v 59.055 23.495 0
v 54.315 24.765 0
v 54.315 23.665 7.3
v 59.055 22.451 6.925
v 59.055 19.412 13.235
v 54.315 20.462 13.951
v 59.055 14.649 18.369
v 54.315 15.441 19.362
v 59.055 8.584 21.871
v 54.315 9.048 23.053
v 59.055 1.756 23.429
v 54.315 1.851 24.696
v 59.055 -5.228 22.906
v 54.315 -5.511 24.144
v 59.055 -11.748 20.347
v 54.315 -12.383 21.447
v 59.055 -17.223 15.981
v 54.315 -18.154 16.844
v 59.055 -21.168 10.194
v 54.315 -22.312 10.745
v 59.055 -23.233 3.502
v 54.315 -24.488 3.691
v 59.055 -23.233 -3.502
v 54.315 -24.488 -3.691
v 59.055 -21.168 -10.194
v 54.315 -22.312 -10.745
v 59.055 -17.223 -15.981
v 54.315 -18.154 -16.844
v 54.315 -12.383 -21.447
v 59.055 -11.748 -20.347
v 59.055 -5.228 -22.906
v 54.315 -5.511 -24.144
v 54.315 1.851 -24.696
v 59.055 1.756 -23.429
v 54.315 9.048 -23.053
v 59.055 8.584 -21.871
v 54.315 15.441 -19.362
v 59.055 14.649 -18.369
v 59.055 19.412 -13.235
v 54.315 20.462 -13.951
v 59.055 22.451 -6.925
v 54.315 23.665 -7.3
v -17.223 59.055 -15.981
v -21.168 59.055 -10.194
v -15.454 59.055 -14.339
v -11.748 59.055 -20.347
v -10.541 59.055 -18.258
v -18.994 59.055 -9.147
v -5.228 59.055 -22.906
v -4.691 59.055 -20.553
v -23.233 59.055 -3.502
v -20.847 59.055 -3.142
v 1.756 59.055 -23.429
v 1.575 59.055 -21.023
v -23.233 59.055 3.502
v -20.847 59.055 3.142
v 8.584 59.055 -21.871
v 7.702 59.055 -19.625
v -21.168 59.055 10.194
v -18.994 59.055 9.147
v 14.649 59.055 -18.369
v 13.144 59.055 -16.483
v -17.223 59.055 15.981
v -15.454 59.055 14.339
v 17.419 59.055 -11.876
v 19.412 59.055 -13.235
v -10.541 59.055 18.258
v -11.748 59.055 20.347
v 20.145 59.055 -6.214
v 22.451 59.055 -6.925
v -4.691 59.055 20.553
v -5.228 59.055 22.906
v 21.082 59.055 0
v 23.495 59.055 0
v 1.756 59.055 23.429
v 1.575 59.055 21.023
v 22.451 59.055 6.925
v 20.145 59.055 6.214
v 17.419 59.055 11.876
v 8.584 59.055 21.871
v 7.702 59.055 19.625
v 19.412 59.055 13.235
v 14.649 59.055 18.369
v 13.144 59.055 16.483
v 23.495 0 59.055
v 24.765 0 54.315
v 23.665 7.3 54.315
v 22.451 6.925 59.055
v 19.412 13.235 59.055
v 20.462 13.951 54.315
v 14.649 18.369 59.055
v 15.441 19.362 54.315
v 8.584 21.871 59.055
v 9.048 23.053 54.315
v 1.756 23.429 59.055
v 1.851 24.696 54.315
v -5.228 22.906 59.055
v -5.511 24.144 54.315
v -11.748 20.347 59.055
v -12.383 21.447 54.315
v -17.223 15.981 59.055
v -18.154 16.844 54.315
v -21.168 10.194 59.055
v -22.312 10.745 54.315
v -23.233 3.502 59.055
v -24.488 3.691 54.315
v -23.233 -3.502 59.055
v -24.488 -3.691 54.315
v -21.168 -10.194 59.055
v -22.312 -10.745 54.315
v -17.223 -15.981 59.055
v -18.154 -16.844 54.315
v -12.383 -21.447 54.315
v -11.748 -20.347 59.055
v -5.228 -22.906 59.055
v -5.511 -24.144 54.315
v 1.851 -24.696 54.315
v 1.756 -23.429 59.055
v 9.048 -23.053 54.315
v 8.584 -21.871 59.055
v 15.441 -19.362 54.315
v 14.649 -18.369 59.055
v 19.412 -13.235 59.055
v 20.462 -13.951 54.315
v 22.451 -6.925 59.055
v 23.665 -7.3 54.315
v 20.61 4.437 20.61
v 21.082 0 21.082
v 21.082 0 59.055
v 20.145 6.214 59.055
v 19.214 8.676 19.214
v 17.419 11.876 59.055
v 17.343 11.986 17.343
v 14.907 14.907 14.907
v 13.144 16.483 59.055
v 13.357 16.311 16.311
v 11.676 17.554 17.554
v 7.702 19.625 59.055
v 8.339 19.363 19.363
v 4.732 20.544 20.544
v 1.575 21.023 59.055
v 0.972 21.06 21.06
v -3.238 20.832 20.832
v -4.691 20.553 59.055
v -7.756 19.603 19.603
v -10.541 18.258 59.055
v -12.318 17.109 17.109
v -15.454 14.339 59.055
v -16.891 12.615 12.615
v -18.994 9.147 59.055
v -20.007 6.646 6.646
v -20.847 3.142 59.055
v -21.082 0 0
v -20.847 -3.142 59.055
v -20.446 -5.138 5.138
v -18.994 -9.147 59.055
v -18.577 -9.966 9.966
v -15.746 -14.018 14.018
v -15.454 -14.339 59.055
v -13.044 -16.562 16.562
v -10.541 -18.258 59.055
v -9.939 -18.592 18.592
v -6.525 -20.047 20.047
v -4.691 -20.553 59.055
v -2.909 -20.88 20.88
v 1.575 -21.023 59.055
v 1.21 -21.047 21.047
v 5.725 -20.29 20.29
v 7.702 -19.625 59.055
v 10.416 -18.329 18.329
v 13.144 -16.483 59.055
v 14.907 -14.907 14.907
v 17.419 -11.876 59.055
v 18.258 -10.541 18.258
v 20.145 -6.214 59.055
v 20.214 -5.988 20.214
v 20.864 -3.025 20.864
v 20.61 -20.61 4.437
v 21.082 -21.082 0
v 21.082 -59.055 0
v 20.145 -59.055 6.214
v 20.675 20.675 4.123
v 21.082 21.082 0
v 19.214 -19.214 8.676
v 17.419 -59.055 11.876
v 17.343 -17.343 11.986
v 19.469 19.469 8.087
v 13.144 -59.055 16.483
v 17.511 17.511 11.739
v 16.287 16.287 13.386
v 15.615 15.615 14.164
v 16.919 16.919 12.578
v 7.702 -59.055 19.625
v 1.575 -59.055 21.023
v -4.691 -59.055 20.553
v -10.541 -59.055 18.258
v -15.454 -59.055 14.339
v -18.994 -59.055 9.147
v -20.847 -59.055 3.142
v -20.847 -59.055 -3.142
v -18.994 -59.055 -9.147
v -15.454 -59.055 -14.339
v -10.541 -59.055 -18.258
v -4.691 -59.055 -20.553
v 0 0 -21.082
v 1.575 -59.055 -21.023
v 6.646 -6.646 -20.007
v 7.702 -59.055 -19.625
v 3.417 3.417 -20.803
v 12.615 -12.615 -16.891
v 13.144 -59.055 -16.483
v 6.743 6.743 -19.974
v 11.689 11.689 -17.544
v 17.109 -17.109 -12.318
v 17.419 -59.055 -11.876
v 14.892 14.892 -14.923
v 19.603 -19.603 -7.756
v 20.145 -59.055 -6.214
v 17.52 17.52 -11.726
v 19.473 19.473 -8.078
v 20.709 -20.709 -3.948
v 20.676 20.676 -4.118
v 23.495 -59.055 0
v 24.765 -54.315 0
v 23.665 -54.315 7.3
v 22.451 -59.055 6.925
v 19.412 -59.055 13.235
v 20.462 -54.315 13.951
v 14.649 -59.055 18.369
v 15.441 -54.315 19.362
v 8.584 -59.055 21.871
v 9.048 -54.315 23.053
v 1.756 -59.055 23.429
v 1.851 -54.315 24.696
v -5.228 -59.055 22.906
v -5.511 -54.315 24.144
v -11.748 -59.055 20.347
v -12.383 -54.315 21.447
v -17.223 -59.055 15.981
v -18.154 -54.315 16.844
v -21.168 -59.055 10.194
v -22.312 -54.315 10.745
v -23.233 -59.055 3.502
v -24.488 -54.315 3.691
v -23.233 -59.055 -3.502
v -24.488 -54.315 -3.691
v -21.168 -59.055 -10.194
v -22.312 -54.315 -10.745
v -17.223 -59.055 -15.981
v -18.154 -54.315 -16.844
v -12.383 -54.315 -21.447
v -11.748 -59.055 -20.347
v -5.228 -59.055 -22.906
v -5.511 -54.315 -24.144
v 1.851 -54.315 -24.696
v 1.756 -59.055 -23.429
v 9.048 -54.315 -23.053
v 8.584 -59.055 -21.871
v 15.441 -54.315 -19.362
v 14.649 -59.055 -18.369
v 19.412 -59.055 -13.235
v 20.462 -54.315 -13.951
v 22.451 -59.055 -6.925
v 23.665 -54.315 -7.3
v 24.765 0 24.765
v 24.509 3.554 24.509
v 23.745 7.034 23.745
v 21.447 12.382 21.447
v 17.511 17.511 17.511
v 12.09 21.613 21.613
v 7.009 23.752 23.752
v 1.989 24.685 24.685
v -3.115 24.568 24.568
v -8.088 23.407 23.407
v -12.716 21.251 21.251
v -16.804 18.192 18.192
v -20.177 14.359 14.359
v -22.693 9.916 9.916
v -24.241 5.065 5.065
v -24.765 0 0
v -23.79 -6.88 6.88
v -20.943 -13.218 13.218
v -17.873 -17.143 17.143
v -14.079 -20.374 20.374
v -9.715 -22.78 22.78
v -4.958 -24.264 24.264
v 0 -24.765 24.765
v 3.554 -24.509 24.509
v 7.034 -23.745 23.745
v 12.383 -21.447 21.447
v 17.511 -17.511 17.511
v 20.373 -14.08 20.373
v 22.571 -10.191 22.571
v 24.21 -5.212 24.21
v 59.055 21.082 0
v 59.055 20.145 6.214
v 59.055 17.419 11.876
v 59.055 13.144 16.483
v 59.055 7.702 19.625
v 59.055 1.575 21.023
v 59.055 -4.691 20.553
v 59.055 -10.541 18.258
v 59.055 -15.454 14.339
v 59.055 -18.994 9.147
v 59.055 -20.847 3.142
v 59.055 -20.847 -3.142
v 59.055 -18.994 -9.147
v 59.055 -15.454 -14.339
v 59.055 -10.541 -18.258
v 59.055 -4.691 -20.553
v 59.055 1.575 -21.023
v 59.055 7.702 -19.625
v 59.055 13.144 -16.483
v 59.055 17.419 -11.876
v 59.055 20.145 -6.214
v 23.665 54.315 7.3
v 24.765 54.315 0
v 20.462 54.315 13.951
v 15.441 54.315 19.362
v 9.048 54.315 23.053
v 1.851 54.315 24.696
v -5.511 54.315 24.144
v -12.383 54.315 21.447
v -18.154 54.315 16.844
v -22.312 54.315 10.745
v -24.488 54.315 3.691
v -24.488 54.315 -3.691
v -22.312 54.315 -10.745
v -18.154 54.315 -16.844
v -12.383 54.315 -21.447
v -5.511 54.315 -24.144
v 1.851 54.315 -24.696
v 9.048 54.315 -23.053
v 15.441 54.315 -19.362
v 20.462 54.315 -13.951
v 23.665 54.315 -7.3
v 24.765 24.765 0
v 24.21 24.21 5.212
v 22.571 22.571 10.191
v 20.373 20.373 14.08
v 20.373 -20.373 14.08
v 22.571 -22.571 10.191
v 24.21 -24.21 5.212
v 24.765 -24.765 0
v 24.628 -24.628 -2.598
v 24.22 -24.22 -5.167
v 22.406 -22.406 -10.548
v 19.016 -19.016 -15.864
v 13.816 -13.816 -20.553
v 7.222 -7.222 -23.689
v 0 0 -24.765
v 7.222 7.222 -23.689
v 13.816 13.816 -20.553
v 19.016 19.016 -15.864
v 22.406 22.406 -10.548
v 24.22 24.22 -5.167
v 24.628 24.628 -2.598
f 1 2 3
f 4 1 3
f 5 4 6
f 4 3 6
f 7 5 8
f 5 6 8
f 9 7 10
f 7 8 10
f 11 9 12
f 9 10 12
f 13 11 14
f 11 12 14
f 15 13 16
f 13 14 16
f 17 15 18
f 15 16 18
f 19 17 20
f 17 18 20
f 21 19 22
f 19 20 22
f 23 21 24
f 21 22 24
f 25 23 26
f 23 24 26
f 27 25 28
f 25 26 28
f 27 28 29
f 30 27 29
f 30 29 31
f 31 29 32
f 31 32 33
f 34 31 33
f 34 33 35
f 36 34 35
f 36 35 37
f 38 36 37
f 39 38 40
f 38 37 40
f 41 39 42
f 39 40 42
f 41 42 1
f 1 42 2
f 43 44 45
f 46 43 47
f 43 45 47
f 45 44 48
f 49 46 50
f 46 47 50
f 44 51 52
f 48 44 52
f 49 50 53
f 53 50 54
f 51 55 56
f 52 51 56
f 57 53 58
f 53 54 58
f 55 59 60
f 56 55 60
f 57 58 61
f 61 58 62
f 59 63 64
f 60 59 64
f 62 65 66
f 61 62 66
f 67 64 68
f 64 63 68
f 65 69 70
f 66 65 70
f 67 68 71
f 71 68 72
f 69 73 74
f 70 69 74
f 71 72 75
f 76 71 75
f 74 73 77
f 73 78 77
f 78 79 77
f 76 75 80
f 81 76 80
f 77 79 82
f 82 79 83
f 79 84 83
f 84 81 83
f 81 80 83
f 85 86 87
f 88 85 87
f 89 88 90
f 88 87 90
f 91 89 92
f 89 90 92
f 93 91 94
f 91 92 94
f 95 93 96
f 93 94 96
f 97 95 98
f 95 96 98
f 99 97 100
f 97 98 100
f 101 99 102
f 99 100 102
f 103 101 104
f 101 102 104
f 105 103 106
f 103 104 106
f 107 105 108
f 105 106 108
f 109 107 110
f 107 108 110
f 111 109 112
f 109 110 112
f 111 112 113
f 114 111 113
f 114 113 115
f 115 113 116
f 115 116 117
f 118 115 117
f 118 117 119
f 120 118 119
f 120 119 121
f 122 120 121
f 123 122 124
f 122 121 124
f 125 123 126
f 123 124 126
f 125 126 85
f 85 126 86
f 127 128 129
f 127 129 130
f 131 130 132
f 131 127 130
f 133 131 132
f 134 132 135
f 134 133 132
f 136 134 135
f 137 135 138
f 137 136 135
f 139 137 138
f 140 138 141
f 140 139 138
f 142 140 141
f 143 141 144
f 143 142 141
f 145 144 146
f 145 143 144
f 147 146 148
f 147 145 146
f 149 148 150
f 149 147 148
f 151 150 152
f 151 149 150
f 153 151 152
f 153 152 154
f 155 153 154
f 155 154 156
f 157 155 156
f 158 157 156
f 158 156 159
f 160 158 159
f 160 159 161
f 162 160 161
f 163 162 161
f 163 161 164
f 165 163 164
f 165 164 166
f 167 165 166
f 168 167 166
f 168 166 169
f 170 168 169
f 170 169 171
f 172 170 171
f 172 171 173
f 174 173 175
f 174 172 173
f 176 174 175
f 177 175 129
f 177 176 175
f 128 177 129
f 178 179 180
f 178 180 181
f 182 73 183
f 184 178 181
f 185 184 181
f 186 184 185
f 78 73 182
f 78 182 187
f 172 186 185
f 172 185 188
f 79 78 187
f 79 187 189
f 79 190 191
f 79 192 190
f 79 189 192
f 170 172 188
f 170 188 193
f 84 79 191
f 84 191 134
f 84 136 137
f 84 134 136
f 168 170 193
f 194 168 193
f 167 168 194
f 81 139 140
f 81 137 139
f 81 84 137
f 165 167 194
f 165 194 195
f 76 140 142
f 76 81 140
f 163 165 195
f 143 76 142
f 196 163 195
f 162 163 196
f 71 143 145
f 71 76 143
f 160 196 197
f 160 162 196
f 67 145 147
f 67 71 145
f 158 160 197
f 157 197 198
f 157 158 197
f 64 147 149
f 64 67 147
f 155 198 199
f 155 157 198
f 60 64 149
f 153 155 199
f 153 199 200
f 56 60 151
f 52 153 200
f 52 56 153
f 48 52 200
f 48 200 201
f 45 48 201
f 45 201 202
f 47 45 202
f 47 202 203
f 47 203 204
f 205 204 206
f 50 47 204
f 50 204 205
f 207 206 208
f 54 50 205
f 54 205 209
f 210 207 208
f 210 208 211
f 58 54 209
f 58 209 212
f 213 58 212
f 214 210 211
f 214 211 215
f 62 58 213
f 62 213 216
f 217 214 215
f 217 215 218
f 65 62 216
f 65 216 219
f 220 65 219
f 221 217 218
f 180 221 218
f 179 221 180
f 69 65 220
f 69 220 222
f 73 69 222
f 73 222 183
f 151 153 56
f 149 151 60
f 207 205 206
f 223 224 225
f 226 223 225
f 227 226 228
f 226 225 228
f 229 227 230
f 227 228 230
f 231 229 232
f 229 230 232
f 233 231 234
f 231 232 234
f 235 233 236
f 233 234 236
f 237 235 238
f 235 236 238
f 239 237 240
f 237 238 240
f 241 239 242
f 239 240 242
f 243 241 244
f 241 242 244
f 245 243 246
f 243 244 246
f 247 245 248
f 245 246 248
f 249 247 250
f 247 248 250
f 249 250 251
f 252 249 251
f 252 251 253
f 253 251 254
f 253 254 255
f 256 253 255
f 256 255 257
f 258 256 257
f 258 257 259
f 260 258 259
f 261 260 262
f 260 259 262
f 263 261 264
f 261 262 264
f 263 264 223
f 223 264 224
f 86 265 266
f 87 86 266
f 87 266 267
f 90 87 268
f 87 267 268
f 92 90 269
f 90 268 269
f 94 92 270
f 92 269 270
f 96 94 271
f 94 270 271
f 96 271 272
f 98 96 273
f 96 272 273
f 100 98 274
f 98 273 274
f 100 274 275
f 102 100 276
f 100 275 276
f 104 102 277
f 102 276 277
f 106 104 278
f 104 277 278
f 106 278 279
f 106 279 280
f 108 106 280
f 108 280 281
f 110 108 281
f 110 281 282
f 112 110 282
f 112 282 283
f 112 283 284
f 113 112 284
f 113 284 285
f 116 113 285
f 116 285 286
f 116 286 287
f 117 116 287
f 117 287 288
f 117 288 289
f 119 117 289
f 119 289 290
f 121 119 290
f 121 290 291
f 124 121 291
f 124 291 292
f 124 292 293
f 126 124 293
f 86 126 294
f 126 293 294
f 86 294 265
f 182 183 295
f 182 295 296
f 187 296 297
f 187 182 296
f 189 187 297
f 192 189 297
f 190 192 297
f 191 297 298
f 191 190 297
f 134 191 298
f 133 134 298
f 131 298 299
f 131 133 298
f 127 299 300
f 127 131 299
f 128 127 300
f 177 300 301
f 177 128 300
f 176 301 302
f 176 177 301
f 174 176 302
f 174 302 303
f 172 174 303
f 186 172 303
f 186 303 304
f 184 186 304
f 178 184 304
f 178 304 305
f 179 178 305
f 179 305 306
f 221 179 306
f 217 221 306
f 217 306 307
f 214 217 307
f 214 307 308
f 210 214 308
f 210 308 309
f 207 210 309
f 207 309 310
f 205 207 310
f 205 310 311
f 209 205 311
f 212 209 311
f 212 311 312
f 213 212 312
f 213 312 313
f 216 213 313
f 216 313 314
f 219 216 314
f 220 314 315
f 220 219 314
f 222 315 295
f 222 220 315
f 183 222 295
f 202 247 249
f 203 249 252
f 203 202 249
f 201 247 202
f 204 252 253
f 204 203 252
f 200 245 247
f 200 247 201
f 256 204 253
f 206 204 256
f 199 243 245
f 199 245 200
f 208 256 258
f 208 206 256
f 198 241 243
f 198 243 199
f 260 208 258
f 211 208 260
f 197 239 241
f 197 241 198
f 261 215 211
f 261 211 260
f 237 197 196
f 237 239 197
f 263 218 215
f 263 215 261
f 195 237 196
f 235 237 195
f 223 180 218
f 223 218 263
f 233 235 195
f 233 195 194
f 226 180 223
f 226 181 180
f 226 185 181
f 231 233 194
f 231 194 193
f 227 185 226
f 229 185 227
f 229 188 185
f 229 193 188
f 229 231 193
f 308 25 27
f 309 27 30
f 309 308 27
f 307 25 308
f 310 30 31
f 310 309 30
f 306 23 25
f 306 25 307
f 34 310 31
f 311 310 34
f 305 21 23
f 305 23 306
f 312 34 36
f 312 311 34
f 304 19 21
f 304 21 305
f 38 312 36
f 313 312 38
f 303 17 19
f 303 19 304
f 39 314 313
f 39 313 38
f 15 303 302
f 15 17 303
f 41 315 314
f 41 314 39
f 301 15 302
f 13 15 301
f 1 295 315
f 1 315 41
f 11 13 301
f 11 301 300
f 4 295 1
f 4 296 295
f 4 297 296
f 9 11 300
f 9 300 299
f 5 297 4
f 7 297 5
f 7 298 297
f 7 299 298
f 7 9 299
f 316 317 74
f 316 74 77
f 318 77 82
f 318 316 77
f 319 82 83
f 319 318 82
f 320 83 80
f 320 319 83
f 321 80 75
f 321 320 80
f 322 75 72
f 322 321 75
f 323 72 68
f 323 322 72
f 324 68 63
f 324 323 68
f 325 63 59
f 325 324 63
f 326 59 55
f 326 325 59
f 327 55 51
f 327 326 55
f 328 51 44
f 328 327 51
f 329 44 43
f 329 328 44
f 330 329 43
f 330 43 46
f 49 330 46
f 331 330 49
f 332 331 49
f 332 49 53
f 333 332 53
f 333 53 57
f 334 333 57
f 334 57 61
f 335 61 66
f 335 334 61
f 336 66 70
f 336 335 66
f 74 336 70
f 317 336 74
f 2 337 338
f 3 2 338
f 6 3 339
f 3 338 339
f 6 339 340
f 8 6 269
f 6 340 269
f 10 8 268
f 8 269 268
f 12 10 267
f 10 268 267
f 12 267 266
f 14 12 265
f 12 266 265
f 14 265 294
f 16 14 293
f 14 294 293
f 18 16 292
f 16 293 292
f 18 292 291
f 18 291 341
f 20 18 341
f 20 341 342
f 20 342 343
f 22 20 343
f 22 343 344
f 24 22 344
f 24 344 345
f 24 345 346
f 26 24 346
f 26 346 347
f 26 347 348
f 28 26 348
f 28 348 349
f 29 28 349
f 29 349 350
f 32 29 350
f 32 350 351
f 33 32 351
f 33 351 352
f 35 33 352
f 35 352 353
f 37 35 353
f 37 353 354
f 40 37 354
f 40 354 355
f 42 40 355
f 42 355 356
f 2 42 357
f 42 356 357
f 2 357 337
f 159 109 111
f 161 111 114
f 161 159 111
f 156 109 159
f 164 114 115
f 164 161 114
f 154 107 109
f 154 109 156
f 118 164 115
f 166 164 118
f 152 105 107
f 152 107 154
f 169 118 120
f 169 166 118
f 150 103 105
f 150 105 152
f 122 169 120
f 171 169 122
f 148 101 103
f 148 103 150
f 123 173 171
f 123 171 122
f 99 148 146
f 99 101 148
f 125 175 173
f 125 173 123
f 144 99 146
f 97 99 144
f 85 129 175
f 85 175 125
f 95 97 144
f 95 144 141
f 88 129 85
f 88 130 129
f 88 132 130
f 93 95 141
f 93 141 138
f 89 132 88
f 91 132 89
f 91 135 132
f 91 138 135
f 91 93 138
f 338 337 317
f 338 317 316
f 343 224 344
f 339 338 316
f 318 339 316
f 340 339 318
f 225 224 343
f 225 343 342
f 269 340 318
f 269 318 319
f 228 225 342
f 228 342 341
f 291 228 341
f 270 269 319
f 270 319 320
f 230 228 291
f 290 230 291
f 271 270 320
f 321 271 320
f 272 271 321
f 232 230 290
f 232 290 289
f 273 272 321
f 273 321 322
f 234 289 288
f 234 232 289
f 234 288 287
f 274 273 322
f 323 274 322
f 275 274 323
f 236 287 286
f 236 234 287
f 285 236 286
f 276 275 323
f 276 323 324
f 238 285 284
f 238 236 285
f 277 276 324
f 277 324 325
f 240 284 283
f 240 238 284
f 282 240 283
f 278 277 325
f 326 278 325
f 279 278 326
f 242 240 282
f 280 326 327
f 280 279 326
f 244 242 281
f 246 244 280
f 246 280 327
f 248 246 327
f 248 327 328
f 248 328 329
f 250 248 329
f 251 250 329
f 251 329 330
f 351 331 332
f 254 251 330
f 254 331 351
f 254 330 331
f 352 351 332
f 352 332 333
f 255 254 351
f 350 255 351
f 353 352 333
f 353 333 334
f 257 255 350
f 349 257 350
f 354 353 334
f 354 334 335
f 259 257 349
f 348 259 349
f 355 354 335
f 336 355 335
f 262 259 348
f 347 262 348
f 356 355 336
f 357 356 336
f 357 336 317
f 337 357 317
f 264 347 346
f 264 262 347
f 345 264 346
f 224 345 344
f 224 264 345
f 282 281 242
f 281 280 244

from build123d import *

# Parameters (mm, degrees)
F0_R          = 24.765
F0_R_2        = 21.082
F1_DEPTH      = 59.055
F2_R          = 24.765
F2_R_2        = 21.082
F3_DEPTH      = 59.055
F4_R          = 24.765
F4_R_2        = 21.082
F5_DEPTH      = 59.055
F6_DEPTH      = 59.0560001
F7_DEPTH      = 59.0560001
F8_DEPTH      = 59.0560001
F8_DEPTH_BACK = 59.0560001
F9_SIZE2      = 4.7397045256
F9_SIZE       = 1.27
F9_2_SIZE2    = 4.7397045256
F9_2_SIZE     = 1.27
F9_3_SIZE2    = 4.7397045256
F9_3_SIZE     = 1.27
F10_SIZE2     = 4.7397045256
F10_SIZE      = 1.27


with BuildPart() as f1:
    # F0 (on Front) → F1 (new body, symmetric)
    with BuildSketch(Plane.XZ):
        Circle(F0_R)
        Circle(F0_R_2, mode=Mode.SUBTRACT)
    extrude(amount=F1_DEPTH, both=True)

    # F2 (on Top) → F3 (join)
    with BuildSketch(Plane.XY):
        Circle(F2_R)
        Circle(F2_R_2, mode=Mode.SUBTRACT)
    extrude(amount=F3_DEPTH)

    # F4 (on Right) → F5 (join)
    with BuildSketch(Plane.YZ):
        Circle(F4_R)
        Circle(F4_R_2, mode=Mode.SUBTRACT)
    extrude(amount=F5_DEPTH)

    # F4 (on Right) → F6 (cut, through all)
    with BuildSketch(Plane.YZ):
        Circle(F4_R_2)
    extrude(amount=F6_DEPTH, mode=Mode.SUBTRACT)

    # F2 (on Top) → F7 (cut, through all)
    with BuildSketch(Plane.XY):
        Circle(F2_R_2)
    extrude(amount=F7_DEPTH, mode=Mode.SUBTRACT)

    # F0 (on Front) → F8 (cut, two sides)
    with BuildSketch(Plane.XZ) as f8_sk:
        Circle(F0_R_2)
    extrude(amount=F8_DEPTH, mode=Mode.SUBTRACT)
    extrude(f8_sk.sketch, amount=-F8_DEPTH_BACK, mode=Mode.SUBTRACT)

    # F9
    f9_edges = [f1.edges().sort_by_distance(p)[0] for p in [
        (-24.765, 0, 59.055),
    ]]
    f9_side = f1.faces().sort_by_distance((-24.06454, 0, 59.055))[0]
    chamfer(f9_edges, length=F9_SIZE, length2=F9_SIZE2, reference=f9_side)

    # F9#2
    f9_2_edges = [f1.edges().sort_by_distance(p)[0] for p in [
        (-24.765, -59.055, 0),
    ]]
    f9_2_side = f1.faces().sort_by_distance((-24.06454, -59.055, 0))[0]
    chamfer(f9_2_edges, length=F9_2_SIZE, length2=F9_2_SIZE2, reference=f9_2_side)

    # F9#3
    f9_3_edges = [f1.edges().sort_by_distance(p)[0] for p in [
        (59.055, -24.765, 0),
    ]]
    f9_3_side = f1.faces().sort_by_distance((59.055, -24.06454, 0))[0]
    chamfer(f9_3_edges, length=F9_3_SIZE, length2=F9_3_SIZE2, reference=f9_3_side)

    # F10
    f10_edges = [f1.edges().sort_by_distance(p)[0] for p in [
        (-24.765, 59.055, 0),
    ]]
    f10_side = f1.faces().sort_by_distance((-24.06454, 59.055, 0))[0]
    chamfer(f10_edges, length=F10_SIZE, length2=F10_SIZE2, reference=f10_side)


solid = f1.part
